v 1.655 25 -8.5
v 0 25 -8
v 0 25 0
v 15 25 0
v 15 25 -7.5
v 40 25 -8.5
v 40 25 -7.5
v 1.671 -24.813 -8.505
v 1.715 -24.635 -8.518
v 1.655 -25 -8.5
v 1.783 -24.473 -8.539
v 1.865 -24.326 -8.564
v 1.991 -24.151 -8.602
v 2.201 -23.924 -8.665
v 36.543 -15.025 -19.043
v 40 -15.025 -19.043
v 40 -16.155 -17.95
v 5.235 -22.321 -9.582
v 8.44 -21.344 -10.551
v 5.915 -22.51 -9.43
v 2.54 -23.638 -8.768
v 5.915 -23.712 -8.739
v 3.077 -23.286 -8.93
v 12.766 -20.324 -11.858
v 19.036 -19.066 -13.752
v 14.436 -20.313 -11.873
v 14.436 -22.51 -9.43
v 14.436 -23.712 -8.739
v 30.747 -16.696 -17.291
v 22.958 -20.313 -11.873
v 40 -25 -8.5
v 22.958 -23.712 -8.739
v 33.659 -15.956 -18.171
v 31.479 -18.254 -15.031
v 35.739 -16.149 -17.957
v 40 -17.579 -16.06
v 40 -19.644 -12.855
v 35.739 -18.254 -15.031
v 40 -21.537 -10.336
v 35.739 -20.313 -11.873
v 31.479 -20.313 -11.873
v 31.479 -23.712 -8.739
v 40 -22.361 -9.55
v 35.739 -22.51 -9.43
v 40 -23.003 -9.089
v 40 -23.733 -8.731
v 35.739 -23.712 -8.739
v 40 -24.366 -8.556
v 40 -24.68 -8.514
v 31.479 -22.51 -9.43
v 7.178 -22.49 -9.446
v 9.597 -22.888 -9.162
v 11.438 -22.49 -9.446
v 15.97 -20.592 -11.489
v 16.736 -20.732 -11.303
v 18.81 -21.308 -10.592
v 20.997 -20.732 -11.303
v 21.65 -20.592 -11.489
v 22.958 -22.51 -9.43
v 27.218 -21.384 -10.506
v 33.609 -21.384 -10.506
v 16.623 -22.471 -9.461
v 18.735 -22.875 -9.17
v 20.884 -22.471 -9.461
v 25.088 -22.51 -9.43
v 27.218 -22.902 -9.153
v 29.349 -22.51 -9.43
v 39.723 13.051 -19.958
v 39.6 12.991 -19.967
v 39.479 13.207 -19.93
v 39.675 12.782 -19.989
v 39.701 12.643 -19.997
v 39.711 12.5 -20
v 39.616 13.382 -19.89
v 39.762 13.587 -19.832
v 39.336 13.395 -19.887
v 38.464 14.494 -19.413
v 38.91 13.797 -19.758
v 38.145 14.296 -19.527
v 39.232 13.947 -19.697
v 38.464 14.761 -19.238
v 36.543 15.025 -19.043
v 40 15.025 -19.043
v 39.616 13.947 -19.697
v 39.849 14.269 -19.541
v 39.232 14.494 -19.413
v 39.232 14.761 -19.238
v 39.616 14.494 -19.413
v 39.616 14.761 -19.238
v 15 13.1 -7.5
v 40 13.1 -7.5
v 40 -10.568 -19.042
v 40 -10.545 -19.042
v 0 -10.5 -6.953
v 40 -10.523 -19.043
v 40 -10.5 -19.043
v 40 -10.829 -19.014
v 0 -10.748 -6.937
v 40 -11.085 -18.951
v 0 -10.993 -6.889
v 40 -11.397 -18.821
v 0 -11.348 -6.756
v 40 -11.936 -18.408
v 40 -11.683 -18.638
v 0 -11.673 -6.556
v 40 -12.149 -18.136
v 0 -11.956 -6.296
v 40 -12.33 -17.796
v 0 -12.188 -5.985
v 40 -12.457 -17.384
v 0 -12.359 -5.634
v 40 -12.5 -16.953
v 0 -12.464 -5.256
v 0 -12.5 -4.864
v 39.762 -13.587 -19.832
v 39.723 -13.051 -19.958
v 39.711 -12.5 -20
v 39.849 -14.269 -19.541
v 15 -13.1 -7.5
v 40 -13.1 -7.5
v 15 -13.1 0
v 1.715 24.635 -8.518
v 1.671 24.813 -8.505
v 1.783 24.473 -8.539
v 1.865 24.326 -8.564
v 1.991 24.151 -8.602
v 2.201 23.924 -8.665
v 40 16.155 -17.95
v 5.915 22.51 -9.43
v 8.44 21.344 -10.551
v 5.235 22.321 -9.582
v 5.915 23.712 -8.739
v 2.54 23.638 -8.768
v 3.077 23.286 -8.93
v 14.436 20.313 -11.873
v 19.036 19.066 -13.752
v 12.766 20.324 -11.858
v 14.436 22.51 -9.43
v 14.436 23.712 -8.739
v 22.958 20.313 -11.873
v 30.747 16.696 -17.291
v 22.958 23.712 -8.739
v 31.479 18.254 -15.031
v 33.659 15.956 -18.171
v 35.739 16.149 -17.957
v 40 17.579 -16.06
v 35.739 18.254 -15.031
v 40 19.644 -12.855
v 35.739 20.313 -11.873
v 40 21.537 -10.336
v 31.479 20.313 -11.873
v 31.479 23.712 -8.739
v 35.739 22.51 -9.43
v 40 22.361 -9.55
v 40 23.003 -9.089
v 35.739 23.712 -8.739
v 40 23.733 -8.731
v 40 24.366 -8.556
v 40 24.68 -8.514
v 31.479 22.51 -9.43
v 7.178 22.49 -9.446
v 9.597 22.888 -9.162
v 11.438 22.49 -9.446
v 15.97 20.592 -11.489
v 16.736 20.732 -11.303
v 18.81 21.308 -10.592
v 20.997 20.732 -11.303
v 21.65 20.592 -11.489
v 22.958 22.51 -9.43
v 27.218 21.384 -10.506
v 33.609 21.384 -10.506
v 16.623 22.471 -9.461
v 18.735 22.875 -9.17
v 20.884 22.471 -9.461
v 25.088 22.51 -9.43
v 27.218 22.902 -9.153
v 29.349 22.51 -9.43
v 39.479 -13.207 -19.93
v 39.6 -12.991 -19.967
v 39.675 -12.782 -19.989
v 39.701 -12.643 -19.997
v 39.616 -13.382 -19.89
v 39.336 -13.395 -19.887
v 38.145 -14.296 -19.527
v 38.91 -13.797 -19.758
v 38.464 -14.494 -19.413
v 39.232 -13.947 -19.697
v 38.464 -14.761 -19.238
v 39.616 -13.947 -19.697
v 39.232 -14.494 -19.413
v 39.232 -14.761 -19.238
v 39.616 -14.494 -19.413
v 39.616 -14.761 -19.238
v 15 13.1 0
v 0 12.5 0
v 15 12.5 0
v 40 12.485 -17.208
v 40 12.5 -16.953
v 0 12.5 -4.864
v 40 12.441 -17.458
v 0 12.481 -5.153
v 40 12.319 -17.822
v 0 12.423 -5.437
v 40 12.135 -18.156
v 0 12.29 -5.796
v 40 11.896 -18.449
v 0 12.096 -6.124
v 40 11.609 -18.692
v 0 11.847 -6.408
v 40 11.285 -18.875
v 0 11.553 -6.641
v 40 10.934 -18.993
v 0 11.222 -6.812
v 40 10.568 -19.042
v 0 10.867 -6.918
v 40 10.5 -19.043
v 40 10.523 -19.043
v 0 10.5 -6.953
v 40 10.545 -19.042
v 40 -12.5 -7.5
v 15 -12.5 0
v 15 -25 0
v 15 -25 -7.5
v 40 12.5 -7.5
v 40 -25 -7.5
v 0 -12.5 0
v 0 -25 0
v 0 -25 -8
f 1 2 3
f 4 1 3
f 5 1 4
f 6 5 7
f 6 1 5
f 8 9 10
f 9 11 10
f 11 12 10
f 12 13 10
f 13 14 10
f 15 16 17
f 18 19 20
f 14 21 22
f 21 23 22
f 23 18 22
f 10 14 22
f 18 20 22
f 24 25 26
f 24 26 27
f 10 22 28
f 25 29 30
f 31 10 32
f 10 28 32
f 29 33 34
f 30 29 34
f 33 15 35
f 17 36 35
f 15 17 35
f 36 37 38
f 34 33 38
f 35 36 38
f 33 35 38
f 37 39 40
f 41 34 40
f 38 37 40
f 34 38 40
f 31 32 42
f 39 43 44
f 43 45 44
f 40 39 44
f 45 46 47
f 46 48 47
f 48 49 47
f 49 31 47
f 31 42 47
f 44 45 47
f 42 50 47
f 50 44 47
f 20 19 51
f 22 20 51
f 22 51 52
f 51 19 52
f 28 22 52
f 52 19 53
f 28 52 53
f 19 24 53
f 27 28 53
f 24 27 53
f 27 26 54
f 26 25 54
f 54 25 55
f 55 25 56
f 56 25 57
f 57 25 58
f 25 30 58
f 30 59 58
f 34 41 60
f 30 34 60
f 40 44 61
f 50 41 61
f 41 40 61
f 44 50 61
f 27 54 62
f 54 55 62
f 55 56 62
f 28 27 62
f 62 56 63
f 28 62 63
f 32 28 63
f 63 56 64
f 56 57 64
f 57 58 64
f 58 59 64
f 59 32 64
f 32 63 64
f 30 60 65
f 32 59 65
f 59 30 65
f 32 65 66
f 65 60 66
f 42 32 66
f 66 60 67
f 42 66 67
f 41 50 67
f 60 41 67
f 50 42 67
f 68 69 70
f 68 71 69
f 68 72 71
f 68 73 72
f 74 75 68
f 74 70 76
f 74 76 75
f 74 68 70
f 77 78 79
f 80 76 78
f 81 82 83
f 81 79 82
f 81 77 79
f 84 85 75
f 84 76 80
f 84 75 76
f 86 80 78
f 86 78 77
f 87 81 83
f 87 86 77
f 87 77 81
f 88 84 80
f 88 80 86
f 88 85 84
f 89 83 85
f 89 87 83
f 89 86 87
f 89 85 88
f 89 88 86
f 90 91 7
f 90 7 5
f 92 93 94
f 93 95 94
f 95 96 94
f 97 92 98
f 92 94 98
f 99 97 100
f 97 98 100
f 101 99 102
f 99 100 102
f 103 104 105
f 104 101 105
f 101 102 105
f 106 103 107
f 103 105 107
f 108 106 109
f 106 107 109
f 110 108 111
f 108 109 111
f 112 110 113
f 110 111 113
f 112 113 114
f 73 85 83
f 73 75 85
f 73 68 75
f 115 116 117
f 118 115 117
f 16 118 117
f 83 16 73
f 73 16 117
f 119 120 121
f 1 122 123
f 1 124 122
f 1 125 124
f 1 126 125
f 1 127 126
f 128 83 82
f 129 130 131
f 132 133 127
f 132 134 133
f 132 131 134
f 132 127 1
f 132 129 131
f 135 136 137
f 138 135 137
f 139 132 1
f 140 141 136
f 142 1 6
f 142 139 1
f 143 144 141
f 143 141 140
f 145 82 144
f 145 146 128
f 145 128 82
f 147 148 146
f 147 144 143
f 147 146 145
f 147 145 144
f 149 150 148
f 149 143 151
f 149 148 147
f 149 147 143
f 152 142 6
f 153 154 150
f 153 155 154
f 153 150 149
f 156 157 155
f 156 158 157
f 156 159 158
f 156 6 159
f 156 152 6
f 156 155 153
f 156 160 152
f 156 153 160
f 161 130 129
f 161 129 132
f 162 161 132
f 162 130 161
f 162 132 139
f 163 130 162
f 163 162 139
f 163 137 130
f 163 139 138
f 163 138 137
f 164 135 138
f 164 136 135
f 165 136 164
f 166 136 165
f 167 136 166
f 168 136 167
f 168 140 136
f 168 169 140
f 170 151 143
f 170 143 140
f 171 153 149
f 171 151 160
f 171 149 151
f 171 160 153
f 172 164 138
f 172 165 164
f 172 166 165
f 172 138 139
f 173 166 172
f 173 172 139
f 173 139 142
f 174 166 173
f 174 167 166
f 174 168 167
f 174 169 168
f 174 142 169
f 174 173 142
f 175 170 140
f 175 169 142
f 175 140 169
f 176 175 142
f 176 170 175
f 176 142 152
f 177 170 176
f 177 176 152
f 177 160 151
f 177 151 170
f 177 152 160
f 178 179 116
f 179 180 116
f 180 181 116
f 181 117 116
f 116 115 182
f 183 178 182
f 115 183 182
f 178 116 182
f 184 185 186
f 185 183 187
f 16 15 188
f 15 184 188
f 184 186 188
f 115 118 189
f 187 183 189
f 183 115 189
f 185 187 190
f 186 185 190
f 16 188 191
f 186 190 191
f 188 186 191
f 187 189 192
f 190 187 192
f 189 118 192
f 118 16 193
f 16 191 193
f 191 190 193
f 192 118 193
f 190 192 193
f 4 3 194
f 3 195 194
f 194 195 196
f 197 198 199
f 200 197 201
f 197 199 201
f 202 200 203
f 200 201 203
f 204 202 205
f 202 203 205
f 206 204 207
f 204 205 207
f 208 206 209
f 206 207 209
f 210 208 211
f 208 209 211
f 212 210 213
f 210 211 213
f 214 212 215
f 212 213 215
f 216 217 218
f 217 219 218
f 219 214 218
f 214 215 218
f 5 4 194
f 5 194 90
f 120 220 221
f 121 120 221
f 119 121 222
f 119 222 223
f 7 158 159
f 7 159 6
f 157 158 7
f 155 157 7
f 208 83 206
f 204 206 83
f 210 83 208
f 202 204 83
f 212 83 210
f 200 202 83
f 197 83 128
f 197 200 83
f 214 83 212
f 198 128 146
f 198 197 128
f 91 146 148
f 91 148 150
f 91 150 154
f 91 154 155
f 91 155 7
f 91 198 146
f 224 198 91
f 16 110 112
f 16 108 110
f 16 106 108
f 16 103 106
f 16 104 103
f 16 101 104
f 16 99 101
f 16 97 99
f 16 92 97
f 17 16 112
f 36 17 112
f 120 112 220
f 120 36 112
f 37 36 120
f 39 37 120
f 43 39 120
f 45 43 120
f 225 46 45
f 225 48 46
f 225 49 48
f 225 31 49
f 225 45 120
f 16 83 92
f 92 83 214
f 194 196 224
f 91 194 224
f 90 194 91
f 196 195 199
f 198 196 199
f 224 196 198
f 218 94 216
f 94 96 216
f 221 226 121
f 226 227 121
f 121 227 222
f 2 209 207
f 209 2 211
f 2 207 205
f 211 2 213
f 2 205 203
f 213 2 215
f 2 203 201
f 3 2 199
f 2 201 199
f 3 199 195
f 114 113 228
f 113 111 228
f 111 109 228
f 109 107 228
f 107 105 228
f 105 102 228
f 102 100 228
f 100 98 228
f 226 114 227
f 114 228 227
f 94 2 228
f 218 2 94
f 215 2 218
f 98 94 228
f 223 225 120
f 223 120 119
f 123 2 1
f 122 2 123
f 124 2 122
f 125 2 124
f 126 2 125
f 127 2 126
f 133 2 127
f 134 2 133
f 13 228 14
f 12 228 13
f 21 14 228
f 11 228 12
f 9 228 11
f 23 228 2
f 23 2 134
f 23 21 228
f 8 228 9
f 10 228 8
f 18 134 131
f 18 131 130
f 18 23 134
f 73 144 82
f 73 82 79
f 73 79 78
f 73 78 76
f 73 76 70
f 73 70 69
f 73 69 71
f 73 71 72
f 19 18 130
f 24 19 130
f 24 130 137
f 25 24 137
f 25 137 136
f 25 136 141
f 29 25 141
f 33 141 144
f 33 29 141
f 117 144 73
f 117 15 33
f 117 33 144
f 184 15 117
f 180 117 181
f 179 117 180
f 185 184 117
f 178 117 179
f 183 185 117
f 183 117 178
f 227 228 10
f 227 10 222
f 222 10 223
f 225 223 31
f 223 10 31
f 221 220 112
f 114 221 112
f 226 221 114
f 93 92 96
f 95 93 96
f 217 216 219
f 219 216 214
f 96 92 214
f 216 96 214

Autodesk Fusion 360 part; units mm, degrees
sketch "Skizze1" plane through (0, 0, 0) normal (0, 1, 0) x (1, 0, 0)
  line L0 (0, 0) -> (15, 0)
  line L1 (15, 0) -> (15, 8)
  line L2 (15, 8) -> (0, 8)
  line L3 (0, 8) -> (0, 0)
  line L4 (0, 8) -> (39.7107, 20)
  line L5 (39.7107, 20) -> (40, 19.0428)
  line L6 (40, 19.0428) -> (3.457, 8)
  line L7 (40, 19.0428) -> (40, 8)
  line L8 (40, 8) -> (15, 8)
  dimension "d1" = 15
  dimension "d2" = 8
  dimension "d3" = 1
  dimension "d4" = 20
  dimension "d5" = 40
extrude "Extrusion1" add sketch "Skizze1" along normal mid plane 50
ref_plane "Arbeitsebene1" through (39.8554, 0, -19.5214) normal (0.9572, 0, -0.2893) x (-0.2893, 0, -0.9572)
sketch "Skizze2" plane through (41.9259, 0, -12.6694) normal (0.9572, 0, -0.2893) x (-0.2893, 0, -0.9572)
  line L0 (6.658, 12.5) -> (-8.342, 12.5)
  line L1 (-8.342, 12.5) -> (-8.342, -12.5)
  line L2 (-8.342, -12.5) -> (6.658, -12.5)
  line L3 (6.658, -12.5) -> (6.658, 12.5)
  line L4 (6.658, 12.5) -> (-8.342, -12.5) construction
  line L5 (-8.342, 12.5) -> (6.658, -12.5) construction
  line L6 (6.658, -25) -> (6.658, 25)
  point P0 (-0.842, 0)
  dimension "d11" = 15
  dimension "d23" = 25
extrude "Extrusion2" cut sketch "Skizze2" against normal blind 50
sketch "Skizze3" plane through (40, 0, 0) normal (1, 0, 0) x (0, 0, -1)
  line L0 (8, 12.5) -> (19.0428, 12.5)
  line L1 (19.0428, 12.5) -> (19.0428, 25)
  line L2 (19.0428, 25) -> (8, 25)
  line L3 (8, 25) -> (8, 12.5)
  line L4 (20, -25) -> (20, 25)
  line L5 (20, 25) -> (19.0428, 25)
  line L6 (19.0428, 25) -> (19.0428, 12.5)
  line L7 (19.0428, 12.5) -> (19.0428, -12.5)
  line L8 (19.0428, -12.5) -> (19.0428, -25)
  line L9 (19.0428, -25) -> (20, -25)
  line L10 (8, 12.5) -> (19.0428, 12.5)
  line L11 (19.0428, -12.5) -> (8, -12.5)
  line L12 (8, -12.5) -> (8, -25)
  line L13 (8, -25) -> (19.0428, -25)
  line L14 (19.0428, -25) -> (19.0428, -12.5)
  spline S0 degree 5 poles (20, -12.5) (20, -13.0888) (19.7652, -14.2211) (18.7091, -15.7836) (16.1706, -17.6488) (12.3294, -19.8512) (9.7909, -21.7164) (8.7348, -23.2789) (8.5, -24.4112) (8.5, -25) knots 0 0 0 0 0 0 0.2 0.4 0.6 0.8 1 1 1 1 1 1
  line L15 (20, -11.5) -> (20, -13.5)
  line L16 (8.5, -24) -> (8.5, -26)
  dimension "d14" = 2
  dimension "d15" = 2
  dimension "d16" = 0.5
extrude "Extrusion3" cut sketch "Skizze3" against normal blind 50 contours L4 L8 L9 L14 S0 L15 | L8 L13 L14 S0
extrude "Extrusion4" add 2 faces at (31.6667, -16.6667, -8) (31.6667, 16.6667, -8) along direction (0, 0, 1) blind 0.5
mirror "Spiegeln1" about plane through (0, 0, 0) normal (0, 1, 0) of "Extrusion3"
fillet "Abrundung1" radius 2 2 edges at (20, -12.5, -12.999) (20, 12.5, -12.999)
sketch "Skizze4" plane through (0, 12.5, 0) normal (0, -1, 0) x (1, 0, 0)
  line L0 (0, -4.866) -> (40, -16.9534)
  line L1 (40, -16.9534) -> (40, -7.5)
  line L2 (40, -7.5) -> (15, -7.5)
  line L3 (15, -7.5) -> (15, 0)
  line L4 (15, 0) -> (0, 0)
  line L5 (0, 0) -> (0, -4.866)
  line L6 (15, 0) -> (40, -7.5)
extrude "Extrusion5" add sketch "Skizze4" against normal blind 0.6 contours L2 L3 L6
mirror "Spiegeln2" about plane through (0, 0, 0) normal (0, 1, 0) of "Extrusion5"
equation "d15 = d14"
